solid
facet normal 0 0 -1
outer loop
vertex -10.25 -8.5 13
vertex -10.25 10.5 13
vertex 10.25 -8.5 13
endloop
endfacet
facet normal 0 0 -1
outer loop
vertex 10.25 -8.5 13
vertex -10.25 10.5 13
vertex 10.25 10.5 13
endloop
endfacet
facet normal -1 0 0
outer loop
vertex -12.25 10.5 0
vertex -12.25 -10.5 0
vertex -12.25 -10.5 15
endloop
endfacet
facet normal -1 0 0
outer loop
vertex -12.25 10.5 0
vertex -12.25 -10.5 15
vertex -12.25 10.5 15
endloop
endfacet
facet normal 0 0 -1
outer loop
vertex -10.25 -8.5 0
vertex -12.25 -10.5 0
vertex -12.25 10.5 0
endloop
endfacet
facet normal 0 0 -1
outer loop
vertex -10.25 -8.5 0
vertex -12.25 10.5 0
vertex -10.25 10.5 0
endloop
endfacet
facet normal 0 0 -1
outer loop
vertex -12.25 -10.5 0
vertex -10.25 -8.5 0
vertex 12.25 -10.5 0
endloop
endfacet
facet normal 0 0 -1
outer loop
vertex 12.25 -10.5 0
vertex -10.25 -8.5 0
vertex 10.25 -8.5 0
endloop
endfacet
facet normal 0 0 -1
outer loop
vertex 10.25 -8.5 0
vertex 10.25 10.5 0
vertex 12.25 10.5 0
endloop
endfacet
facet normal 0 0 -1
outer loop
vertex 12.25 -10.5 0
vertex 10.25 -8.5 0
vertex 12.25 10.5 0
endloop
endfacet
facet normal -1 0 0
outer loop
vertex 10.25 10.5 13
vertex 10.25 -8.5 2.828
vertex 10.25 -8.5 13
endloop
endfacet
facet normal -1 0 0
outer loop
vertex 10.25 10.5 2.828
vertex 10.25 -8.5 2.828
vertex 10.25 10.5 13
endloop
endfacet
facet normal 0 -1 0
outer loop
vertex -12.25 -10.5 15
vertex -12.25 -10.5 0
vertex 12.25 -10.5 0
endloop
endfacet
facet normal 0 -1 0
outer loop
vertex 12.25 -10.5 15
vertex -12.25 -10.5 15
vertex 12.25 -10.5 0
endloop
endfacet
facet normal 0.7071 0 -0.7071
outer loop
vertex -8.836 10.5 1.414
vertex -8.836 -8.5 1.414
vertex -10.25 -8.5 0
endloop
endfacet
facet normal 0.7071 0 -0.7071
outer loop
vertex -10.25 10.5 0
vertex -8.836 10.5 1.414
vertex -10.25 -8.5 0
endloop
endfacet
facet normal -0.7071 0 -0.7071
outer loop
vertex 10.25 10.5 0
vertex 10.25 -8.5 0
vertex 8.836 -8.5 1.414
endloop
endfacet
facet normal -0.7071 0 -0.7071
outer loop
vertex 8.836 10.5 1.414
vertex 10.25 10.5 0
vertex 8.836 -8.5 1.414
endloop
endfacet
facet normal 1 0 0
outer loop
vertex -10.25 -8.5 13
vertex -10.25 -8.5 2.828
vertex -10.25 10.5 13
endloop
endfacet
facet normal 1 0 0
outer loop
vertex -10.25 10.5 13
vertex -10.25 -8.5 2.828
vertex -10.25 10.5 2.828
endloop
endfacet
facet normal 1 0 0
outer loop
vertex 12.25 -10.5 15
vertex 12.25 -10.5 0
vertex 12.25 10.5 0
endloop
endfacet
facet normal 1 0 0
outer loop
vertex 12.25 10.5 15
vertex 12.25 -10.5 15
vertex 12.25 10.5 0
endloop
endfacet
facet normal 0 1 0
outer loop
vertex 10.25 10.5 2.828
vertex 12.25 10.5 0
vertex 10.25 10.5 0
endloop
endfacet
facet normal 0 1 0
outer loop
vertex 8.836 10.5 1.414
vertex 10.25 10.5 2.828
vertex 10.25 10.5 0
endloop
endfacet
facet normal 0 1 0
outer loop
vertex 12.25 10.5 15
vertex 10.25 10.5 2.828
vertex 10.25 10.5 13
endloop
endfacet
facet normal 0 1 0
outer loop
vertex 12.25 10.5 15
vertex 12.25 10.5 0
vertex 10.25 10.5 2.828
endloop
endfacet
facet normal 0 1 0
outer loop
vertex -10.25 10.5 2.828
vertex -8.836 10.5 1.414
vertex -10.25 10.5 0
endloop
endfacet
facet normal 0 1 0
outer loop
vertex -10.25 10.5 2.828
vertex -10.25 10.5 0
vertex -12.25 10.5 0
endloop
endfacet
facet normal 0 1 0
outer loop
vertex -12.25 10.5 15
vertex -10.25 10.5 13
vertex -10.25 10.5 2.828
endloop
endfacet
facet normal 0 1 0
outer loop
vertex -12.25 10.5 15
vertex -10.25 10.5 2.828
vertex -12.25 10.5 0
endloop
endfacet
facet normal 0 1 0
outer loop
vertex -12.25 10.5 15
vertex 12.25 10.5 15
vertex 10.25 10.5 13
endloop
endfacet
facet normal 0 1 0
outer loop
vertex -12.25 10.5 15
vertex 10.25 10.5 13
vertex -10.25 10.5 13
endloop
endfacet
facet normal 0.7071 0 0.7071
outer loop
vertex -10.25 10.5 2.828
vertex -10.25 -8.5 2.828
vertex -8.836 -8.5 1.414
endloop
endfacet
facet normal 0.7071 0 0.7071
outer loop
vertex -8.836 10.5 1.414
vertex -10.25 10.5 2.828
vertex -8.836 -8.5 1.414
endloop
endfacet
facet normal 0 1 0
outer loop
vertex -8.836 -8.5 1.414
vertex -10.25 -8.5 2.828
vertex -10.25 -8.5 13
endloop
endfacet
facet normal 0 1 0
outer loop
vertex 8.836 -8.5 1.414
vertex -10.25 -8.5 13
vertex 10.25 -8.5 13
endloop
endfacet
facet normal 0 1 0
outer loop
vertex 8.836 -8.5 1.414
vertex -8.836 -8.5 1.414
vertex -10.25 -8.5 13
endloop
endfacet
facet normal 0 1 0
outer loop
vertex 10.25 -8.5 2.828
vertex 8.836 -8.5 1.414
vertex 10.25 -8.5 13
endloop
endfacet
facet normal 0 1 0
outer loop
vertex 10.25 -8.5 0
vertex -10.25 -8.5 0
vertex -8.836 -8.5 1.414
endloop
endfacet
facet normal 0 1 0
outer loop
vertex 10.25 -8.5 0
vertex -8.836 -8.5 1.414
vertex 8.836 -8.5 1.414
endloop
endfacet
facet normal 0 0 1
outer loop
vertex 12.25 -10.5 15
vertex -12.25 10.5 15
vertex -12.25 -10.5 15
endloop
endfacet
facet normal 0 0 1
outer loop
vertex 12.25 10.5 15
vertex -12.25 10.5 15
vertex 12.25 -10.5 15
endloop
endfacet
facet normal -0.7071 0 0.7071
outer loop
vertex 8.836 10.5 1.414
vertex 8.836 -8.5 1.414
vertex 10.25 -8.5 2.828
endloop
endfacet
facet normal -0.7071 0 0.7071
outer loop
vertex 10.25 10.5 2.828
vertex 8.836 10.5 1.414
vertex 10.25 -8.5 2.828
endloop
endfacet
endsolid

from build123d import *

# Parameters (mm, degrees)
F0_W     = 24.5
F0_H     = 21
F1_DEPTH = 15
F2_T     = -2
F4_DEPTH = 19


with BuildPart() as f1:
    # F0 (on Top) → F1 (new body)
    with BuildSketch(Plane.XY):
        Rectangle(F0_W, F0_H)
    extrude(amount=F1_DEPTH)

    # F2
    f2_openings = [f1.faces().sort_by_distance(p)[0] for p in [
        (0, 0, 0),
        (0, 10.5, 7.5),
    ]]
    offset(amount=F2_T, openings=f2_openings)

    # F3 (on face) → F4 (join)
    with BuildSketch(Plane(origin=(0, -8.5, 0), x_dir=(-1, 0, 0), z_dir=(0, 1, 0))):
        Polygon((-10.25, 2.8284271247), (-10.25, 0), (-8.8357864376, 1.4142135624), align=None)
        Polygon((8.8357864376, 1.4142135624), (10.25, 0), (10.25, 2.8284271247), align=None)
    extrude(amount=F4_DEPTH)


solid = f1.part
